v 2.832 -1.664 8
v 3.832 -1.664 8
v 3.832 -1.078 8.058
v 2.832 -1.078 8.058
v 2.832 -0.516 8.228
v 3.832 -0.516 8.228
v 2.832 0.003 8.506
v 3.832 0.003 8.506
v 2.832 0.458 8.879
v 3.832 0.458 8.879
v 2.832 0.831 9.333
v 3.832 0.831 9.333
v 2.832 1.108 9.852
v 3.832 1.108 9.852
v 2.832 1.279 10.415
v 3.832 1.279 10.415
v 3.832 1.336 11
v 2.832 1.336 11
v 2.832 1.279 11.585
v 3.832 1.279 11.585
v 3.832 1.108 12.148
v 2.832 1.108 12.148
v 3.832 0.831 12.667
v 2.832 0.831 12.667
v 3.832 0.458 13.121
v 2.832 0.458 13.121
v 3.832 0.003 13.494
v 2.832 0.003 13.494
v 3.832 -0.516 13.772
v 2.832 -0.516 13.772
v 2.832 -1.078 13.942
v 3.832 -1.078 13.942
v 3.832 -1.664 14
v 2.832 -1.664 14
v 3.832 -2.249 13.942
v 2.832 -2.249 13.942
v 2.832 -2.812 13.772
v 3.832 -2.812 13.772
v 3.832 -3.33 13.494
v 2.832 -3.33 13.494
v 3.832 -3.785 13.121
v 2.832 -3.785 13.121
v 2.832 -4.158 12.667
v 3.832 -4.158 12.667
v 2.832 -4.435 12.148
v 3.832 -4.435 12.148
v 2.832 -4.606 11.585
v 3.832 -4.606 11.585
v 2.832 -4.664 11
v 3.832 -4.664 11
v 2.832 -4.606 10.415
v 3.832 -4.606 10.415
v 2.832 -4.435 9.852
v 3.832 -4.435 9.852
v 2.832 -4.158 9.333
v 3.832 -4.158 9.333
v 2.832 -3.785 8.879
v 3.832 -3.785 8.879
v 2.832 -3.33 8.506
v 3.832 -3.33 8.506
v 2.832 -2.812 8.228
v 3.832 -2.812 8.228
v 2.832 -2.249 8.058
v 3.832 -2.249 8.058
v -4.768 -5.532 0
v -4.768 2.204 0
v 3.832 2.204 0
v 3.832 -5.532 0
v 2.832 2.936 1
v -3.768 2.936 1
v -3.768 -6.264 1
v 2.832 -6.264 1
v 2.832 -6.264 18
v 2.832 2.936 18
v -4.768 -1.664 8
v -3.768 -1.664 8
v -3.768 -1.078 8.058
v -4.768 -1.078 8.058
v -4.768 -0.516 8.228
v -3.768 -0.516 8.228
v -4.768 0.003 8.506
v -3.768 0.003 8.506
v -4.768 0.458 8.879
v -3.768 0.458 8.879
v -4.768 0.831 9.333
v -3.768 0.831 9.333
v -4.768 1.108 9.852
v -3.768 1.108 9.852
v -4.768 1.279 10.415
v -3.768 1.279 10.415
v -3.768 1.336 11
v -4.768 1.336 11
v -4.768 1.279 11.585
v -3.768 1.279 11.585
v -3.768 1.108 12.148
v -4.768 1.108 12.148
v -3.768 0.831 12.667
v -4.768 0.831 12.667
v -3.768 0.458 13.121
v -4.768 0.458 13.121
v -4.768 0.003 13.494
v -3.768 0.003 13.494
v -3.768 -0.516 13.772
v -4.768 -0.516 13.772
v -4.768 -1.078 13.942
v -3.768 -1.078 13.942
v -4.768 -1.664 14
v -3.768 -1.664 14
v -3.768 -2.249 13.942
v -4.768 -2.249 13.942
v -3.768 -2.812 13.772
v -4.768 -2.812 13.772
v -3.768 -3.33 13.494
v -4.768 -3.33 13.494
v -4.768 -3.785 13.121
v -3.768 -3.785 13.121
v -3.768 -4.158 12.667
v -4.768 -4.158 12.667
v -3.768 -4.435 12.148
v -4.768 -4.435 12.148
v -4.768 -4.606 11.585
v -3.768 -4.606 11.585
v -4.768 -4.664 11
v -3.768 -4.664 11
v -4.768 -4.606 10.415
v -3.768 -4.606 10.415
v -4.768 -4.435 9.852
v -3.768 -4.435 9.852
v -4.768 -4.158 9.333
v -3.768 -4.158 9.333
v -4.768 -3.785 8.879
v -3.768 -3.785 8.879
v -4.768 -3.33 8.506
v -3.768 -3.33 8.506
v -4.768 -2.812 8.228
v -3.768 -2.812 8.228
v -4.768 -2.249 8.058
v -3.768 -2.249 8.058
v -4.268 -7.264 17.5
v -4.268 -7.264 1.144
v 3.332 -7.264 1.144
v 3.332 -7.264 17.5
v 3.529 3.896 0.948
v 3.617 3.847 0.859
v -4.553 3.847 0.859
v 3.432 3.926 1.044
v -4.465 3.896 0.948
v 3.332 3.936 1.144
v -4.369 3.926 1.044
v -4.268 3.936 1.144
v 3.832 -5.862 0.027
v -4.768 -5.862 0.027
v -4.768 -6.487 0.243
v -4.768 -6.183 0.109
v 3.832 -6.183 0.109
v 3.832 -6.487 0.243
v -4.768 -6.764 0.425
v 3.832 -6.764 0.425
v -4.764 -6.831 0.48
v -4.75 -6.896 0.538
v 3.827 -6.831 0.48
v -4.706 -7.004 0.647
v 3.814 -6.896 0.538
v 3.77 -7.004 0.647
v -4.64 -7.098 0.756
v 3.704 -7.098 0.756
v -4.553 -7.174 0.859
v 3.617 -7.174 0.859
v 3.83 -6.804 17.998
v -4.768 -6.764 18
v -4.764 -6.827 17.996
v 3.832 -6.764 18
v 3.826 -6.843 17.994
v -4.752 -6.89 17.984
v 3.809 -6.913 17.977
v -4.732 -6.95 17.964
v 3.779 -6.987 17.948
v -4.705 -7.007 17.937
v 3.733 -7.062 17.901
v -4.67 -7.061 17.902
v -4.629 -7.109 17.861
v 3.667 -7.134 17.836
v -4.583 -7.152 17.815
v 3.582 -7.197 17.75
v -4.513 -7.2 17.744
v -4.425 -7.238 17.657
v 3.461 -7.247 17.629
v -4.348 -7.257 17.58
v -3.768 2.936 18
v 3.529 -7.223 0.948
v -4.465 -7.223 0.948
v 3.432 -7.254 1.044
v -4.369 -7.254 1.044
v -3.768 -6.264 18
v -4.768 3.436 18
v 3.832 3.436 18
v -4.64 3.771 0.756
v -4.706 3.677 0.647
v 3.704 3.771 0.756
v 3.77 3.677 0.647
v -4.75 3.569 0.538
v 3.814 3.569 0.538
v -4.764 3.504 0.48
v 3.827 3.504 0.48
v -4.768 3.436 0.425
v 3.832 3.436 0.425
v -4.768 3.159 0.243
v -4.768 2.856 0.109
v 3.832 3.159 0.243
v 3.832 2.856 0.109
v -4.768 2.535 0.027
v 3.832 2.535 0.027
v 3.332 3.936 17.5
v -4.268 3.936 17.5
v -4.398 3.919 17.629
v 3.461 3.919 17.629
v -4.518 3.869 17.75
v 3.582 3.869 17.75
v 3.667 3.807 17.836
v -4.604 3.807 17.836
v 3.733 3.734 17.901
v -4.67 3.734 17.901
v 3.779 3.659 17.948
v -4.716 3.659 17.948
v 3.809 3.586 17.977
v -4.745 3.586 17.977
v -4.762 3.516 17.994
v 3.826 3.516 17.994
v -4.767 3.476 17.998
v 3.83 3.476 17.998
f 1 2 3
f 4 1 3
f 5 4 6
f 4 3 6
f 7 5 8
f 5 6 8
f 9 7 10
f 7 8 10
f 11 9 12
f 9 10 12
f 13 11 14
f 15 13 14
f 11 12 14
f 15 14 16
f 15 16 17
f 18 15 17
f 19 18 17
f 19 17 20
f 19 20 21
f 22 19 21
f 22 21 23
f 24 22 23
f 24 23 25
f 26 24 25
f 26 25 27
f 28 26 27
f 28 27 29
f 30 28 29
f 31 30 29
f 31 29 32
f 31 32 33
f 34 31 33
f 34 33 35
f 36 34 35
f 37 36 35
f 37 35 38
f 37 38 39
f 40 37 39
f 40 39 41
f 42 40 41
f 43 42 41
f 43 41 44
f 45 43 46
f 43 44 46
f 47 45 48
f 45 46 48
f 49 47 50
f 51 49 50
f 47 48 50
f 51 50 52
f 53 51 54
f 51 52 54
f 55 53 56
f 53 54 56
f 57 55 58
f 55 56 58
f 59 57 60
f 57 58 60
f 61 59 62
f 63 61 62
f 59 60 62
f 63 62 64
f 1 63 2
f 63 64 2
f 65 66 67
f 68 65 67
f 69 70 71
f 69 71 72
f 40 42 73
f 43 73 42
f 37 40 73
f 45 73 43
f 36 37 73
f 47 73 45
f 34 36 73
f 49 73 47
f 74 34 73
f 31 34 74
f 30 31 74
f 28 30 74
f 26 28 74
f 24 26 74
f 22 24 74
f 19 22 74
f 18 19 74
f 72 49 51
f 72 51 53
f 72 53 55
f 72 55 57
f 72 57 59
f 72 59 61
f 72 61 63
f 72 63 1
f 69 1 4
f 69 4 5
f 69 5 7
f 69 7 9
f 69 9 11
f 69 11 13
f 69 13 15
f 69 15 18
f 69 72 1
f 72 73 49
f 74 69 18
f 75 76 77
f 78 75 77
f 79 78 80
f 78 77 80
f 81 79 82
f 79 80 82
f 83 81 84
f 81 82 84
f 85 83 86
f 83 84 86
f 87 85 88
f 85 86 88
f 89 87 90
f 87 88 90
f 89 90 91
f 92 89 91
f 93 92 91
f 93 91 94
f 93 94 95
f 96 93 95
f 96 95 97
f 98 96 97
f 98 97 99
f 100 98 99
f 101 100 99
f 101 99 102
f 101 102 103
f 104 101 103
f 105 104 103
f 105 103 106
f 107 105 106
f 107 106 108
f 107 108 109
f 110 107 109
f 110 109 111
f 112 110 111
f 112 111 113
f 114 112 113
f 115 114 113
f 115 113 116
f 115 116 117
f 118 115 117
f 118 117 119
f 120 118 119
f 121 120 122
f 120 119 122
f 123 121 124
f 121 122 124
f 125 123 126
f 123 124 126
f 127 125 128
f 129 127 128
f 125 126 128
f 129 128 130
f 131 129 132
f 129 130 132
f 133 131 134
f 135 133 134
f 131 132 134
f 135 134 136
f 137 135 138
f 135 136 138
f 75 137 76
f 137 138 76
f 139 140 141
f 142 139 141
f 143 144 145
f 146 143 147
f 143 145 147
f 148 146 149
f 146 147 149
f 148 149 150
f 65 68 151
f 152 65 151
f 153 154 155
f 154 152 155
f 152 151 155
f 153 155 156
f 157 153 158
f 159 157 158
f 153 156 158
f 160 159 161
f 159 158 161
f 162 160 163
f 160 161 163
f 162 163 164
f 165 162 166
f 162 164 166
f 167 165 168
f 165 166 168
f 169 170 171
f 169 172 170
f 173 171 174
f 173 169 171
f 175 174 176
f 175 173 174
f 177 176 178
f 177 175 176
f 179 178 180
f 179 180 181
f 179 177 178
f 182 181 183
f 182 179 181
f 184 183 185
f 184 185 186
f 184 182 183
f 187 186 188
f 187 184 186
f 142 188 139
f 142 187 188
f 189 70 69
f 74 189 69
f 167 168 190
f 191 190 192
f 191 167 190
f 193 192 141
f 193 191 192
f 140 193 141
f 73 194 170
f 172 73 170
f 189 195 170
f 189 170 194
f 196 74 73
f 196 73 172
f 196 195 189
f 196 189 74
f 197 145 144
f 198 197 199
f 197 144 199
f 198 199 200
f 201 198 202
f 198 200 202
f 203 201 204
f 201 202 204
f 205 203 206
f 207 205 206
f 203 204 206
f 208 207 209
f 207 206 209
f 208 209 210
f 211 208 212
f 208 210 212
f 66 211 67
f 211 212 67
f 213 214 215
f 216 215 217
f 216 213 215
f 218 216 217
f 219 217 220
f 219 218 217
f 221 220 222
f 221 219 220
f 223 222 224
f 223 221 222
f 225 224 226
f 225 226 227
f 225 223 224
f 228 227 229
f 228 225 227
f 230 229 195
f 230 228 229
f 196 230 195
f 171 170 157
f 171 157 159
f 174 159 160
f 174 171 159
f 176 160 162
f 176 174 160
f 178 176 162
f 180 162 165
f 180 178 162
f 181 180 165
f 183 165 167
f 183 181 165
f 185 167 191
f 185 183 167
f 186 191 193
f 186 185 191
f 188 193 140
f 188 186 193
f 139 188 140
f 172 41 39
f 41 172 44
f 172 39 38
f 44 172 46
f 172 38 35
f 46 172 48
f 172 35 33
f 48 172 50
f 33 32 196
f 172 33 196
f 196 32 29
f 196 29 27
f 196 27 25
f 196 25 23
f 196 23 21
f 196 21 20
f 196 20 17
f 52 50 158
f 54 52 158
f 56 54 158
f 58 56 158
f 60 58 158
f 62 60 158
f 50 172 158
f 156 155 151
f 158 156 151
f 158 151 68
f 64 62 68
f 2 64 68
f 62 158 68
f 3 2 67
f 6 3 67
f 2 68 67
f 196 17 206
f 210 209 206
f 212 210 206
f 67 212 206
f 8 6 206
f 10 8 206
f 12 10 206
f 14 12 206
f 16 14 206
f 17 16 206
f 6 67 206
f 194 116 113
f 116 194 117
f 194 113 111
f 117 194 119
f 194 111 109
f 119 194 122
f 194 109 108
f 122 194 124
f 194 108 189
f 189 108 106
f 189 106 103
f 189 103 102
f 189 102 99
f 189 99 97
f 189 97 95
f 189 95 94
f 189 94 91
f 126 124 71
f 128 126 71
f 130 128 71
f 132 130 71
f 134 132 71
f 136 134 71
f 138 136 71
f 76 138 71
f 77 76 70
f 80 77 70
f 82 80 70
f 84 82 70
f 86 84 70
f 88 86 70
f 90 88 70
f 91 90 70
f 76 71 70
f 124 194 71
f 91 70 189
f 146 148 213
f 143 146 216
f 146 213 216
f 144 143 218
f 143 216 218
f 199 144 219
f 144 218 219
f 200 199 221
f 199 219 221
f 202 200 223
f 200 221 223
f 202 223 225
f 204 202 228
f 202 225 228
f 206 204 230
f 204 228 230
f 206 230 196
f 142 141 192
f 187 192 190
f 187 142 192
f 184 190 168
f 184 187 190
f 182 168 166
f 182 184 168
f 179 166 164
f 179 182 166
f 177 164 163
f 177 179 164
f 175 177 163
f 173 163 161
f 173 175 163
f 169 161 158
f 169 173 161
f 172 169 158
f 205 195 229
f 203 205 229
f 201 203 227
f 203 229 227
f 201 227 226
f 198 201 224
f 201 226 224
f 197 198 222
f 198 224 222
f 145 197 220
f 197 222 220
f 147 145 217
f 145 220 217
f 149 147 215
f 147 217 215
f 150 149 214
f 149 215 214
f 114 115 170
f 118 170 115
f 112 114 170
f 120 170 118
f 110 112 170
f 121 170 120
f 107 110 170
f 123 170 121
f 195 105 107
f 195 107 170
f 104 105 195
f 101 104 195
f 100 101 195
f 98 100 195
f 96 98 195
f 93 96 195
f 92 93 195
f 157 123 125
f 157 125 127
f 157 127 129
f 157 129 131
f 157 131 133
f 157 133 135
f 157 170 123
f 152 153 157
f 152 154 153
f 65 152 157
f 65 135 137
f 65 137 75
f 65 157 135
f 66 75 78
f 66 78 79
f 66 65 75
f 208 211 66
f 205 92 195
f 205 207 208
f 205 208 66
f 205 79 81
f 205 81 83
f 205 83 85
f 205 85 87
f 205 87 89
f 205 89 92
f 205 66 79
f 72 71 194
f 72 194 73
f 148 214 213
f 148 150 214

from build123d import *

# Parameters (mm, degrees)
ESQUISSE1_W             = 8.6
ESQUISSE1_H             = 11.2
BOSS_EXTRU_1_DEPTH      = 18
COQUE1_T                = -1
ESQUISSE2_R             = 3
ENL_V_MAT_EXTRU_1_DEPTH = 20
CONG_2_R                = 0.5


with BuildPart() as part:
    # Esquisse1 → Boss.-Extru.1 (new body)
    with BuildSketch(Plane.XY):
        with Locations((-0.468112778, -1.663701506)):
            Rectangle(ESQUISSE1_W, ESQUISSE1_H)
    extrude(amount=BOSS_EXTRU_1_DEPTH)

    # Coque1
    coque1_openings = [part.faces().sort_by_distance(p)[0] for p in [
        (-0.468112778, -1.663701506, 18),
    ]]
    offset(amount=COQUE1_T, openings=coque1_openings, kind=Kind.INTERSECTION)

    # Esquisse2 → Enlèv. mat.-Extru.1 (cut)
    with BuildSketch(Plane(origin=(3.831887222, 0, 0), x_dir=(0, 0, -1), z_dir=(1, 0, 0))):
        with BuildLine():
            ThreePointArc((-1, 3.936298494), (-0.267949192, 3.204247687), (0, 2.204247687))
            Line((0, 2.204247687), (0, 3.936298494))
            Line((0, 3.936298494), (-1, 3.936298494))
        make_face()
        with BuildLine():
            Line((-1, -7.263701506), (0, -7.263701506))
            Line((0, -7.263701506), (0, -5.531650698))
            ThreePointArc((0, -5.531650698), (-0.267949192, -6.531650698), (-1, -7.263701506))
        make_face()
        with Locations((-11, -1.663701506)):
            Circle(ESQUISSE2_R)
    extrude(amount=-ENL_V_MAT_EXTRU_1_DEPTH, mode=Mode.SUBTRACT)

    # Congé2
    cong_2_edges = [part.edges().sort_by_distance(p)[0] for p in [
        (-0.468112778, 3.936298494, 18),
        (-0.468112778, 3.936298494, 1),
        (-0.468112778, -7.263701506, 1),
        (-4.768112778, 3.936298494, 9.5),
        (3.831887222, 3.936298494, 9.5),
        (3.831887222, -7.263701506, 9.5),
        (-4.768112778, -7.263701506, 9.5),
        (-0.468112778, -7.263701506, 18),
    ]]
    fillet(cong_2_edges, radius=CONG_2_R)


solid = part.part
